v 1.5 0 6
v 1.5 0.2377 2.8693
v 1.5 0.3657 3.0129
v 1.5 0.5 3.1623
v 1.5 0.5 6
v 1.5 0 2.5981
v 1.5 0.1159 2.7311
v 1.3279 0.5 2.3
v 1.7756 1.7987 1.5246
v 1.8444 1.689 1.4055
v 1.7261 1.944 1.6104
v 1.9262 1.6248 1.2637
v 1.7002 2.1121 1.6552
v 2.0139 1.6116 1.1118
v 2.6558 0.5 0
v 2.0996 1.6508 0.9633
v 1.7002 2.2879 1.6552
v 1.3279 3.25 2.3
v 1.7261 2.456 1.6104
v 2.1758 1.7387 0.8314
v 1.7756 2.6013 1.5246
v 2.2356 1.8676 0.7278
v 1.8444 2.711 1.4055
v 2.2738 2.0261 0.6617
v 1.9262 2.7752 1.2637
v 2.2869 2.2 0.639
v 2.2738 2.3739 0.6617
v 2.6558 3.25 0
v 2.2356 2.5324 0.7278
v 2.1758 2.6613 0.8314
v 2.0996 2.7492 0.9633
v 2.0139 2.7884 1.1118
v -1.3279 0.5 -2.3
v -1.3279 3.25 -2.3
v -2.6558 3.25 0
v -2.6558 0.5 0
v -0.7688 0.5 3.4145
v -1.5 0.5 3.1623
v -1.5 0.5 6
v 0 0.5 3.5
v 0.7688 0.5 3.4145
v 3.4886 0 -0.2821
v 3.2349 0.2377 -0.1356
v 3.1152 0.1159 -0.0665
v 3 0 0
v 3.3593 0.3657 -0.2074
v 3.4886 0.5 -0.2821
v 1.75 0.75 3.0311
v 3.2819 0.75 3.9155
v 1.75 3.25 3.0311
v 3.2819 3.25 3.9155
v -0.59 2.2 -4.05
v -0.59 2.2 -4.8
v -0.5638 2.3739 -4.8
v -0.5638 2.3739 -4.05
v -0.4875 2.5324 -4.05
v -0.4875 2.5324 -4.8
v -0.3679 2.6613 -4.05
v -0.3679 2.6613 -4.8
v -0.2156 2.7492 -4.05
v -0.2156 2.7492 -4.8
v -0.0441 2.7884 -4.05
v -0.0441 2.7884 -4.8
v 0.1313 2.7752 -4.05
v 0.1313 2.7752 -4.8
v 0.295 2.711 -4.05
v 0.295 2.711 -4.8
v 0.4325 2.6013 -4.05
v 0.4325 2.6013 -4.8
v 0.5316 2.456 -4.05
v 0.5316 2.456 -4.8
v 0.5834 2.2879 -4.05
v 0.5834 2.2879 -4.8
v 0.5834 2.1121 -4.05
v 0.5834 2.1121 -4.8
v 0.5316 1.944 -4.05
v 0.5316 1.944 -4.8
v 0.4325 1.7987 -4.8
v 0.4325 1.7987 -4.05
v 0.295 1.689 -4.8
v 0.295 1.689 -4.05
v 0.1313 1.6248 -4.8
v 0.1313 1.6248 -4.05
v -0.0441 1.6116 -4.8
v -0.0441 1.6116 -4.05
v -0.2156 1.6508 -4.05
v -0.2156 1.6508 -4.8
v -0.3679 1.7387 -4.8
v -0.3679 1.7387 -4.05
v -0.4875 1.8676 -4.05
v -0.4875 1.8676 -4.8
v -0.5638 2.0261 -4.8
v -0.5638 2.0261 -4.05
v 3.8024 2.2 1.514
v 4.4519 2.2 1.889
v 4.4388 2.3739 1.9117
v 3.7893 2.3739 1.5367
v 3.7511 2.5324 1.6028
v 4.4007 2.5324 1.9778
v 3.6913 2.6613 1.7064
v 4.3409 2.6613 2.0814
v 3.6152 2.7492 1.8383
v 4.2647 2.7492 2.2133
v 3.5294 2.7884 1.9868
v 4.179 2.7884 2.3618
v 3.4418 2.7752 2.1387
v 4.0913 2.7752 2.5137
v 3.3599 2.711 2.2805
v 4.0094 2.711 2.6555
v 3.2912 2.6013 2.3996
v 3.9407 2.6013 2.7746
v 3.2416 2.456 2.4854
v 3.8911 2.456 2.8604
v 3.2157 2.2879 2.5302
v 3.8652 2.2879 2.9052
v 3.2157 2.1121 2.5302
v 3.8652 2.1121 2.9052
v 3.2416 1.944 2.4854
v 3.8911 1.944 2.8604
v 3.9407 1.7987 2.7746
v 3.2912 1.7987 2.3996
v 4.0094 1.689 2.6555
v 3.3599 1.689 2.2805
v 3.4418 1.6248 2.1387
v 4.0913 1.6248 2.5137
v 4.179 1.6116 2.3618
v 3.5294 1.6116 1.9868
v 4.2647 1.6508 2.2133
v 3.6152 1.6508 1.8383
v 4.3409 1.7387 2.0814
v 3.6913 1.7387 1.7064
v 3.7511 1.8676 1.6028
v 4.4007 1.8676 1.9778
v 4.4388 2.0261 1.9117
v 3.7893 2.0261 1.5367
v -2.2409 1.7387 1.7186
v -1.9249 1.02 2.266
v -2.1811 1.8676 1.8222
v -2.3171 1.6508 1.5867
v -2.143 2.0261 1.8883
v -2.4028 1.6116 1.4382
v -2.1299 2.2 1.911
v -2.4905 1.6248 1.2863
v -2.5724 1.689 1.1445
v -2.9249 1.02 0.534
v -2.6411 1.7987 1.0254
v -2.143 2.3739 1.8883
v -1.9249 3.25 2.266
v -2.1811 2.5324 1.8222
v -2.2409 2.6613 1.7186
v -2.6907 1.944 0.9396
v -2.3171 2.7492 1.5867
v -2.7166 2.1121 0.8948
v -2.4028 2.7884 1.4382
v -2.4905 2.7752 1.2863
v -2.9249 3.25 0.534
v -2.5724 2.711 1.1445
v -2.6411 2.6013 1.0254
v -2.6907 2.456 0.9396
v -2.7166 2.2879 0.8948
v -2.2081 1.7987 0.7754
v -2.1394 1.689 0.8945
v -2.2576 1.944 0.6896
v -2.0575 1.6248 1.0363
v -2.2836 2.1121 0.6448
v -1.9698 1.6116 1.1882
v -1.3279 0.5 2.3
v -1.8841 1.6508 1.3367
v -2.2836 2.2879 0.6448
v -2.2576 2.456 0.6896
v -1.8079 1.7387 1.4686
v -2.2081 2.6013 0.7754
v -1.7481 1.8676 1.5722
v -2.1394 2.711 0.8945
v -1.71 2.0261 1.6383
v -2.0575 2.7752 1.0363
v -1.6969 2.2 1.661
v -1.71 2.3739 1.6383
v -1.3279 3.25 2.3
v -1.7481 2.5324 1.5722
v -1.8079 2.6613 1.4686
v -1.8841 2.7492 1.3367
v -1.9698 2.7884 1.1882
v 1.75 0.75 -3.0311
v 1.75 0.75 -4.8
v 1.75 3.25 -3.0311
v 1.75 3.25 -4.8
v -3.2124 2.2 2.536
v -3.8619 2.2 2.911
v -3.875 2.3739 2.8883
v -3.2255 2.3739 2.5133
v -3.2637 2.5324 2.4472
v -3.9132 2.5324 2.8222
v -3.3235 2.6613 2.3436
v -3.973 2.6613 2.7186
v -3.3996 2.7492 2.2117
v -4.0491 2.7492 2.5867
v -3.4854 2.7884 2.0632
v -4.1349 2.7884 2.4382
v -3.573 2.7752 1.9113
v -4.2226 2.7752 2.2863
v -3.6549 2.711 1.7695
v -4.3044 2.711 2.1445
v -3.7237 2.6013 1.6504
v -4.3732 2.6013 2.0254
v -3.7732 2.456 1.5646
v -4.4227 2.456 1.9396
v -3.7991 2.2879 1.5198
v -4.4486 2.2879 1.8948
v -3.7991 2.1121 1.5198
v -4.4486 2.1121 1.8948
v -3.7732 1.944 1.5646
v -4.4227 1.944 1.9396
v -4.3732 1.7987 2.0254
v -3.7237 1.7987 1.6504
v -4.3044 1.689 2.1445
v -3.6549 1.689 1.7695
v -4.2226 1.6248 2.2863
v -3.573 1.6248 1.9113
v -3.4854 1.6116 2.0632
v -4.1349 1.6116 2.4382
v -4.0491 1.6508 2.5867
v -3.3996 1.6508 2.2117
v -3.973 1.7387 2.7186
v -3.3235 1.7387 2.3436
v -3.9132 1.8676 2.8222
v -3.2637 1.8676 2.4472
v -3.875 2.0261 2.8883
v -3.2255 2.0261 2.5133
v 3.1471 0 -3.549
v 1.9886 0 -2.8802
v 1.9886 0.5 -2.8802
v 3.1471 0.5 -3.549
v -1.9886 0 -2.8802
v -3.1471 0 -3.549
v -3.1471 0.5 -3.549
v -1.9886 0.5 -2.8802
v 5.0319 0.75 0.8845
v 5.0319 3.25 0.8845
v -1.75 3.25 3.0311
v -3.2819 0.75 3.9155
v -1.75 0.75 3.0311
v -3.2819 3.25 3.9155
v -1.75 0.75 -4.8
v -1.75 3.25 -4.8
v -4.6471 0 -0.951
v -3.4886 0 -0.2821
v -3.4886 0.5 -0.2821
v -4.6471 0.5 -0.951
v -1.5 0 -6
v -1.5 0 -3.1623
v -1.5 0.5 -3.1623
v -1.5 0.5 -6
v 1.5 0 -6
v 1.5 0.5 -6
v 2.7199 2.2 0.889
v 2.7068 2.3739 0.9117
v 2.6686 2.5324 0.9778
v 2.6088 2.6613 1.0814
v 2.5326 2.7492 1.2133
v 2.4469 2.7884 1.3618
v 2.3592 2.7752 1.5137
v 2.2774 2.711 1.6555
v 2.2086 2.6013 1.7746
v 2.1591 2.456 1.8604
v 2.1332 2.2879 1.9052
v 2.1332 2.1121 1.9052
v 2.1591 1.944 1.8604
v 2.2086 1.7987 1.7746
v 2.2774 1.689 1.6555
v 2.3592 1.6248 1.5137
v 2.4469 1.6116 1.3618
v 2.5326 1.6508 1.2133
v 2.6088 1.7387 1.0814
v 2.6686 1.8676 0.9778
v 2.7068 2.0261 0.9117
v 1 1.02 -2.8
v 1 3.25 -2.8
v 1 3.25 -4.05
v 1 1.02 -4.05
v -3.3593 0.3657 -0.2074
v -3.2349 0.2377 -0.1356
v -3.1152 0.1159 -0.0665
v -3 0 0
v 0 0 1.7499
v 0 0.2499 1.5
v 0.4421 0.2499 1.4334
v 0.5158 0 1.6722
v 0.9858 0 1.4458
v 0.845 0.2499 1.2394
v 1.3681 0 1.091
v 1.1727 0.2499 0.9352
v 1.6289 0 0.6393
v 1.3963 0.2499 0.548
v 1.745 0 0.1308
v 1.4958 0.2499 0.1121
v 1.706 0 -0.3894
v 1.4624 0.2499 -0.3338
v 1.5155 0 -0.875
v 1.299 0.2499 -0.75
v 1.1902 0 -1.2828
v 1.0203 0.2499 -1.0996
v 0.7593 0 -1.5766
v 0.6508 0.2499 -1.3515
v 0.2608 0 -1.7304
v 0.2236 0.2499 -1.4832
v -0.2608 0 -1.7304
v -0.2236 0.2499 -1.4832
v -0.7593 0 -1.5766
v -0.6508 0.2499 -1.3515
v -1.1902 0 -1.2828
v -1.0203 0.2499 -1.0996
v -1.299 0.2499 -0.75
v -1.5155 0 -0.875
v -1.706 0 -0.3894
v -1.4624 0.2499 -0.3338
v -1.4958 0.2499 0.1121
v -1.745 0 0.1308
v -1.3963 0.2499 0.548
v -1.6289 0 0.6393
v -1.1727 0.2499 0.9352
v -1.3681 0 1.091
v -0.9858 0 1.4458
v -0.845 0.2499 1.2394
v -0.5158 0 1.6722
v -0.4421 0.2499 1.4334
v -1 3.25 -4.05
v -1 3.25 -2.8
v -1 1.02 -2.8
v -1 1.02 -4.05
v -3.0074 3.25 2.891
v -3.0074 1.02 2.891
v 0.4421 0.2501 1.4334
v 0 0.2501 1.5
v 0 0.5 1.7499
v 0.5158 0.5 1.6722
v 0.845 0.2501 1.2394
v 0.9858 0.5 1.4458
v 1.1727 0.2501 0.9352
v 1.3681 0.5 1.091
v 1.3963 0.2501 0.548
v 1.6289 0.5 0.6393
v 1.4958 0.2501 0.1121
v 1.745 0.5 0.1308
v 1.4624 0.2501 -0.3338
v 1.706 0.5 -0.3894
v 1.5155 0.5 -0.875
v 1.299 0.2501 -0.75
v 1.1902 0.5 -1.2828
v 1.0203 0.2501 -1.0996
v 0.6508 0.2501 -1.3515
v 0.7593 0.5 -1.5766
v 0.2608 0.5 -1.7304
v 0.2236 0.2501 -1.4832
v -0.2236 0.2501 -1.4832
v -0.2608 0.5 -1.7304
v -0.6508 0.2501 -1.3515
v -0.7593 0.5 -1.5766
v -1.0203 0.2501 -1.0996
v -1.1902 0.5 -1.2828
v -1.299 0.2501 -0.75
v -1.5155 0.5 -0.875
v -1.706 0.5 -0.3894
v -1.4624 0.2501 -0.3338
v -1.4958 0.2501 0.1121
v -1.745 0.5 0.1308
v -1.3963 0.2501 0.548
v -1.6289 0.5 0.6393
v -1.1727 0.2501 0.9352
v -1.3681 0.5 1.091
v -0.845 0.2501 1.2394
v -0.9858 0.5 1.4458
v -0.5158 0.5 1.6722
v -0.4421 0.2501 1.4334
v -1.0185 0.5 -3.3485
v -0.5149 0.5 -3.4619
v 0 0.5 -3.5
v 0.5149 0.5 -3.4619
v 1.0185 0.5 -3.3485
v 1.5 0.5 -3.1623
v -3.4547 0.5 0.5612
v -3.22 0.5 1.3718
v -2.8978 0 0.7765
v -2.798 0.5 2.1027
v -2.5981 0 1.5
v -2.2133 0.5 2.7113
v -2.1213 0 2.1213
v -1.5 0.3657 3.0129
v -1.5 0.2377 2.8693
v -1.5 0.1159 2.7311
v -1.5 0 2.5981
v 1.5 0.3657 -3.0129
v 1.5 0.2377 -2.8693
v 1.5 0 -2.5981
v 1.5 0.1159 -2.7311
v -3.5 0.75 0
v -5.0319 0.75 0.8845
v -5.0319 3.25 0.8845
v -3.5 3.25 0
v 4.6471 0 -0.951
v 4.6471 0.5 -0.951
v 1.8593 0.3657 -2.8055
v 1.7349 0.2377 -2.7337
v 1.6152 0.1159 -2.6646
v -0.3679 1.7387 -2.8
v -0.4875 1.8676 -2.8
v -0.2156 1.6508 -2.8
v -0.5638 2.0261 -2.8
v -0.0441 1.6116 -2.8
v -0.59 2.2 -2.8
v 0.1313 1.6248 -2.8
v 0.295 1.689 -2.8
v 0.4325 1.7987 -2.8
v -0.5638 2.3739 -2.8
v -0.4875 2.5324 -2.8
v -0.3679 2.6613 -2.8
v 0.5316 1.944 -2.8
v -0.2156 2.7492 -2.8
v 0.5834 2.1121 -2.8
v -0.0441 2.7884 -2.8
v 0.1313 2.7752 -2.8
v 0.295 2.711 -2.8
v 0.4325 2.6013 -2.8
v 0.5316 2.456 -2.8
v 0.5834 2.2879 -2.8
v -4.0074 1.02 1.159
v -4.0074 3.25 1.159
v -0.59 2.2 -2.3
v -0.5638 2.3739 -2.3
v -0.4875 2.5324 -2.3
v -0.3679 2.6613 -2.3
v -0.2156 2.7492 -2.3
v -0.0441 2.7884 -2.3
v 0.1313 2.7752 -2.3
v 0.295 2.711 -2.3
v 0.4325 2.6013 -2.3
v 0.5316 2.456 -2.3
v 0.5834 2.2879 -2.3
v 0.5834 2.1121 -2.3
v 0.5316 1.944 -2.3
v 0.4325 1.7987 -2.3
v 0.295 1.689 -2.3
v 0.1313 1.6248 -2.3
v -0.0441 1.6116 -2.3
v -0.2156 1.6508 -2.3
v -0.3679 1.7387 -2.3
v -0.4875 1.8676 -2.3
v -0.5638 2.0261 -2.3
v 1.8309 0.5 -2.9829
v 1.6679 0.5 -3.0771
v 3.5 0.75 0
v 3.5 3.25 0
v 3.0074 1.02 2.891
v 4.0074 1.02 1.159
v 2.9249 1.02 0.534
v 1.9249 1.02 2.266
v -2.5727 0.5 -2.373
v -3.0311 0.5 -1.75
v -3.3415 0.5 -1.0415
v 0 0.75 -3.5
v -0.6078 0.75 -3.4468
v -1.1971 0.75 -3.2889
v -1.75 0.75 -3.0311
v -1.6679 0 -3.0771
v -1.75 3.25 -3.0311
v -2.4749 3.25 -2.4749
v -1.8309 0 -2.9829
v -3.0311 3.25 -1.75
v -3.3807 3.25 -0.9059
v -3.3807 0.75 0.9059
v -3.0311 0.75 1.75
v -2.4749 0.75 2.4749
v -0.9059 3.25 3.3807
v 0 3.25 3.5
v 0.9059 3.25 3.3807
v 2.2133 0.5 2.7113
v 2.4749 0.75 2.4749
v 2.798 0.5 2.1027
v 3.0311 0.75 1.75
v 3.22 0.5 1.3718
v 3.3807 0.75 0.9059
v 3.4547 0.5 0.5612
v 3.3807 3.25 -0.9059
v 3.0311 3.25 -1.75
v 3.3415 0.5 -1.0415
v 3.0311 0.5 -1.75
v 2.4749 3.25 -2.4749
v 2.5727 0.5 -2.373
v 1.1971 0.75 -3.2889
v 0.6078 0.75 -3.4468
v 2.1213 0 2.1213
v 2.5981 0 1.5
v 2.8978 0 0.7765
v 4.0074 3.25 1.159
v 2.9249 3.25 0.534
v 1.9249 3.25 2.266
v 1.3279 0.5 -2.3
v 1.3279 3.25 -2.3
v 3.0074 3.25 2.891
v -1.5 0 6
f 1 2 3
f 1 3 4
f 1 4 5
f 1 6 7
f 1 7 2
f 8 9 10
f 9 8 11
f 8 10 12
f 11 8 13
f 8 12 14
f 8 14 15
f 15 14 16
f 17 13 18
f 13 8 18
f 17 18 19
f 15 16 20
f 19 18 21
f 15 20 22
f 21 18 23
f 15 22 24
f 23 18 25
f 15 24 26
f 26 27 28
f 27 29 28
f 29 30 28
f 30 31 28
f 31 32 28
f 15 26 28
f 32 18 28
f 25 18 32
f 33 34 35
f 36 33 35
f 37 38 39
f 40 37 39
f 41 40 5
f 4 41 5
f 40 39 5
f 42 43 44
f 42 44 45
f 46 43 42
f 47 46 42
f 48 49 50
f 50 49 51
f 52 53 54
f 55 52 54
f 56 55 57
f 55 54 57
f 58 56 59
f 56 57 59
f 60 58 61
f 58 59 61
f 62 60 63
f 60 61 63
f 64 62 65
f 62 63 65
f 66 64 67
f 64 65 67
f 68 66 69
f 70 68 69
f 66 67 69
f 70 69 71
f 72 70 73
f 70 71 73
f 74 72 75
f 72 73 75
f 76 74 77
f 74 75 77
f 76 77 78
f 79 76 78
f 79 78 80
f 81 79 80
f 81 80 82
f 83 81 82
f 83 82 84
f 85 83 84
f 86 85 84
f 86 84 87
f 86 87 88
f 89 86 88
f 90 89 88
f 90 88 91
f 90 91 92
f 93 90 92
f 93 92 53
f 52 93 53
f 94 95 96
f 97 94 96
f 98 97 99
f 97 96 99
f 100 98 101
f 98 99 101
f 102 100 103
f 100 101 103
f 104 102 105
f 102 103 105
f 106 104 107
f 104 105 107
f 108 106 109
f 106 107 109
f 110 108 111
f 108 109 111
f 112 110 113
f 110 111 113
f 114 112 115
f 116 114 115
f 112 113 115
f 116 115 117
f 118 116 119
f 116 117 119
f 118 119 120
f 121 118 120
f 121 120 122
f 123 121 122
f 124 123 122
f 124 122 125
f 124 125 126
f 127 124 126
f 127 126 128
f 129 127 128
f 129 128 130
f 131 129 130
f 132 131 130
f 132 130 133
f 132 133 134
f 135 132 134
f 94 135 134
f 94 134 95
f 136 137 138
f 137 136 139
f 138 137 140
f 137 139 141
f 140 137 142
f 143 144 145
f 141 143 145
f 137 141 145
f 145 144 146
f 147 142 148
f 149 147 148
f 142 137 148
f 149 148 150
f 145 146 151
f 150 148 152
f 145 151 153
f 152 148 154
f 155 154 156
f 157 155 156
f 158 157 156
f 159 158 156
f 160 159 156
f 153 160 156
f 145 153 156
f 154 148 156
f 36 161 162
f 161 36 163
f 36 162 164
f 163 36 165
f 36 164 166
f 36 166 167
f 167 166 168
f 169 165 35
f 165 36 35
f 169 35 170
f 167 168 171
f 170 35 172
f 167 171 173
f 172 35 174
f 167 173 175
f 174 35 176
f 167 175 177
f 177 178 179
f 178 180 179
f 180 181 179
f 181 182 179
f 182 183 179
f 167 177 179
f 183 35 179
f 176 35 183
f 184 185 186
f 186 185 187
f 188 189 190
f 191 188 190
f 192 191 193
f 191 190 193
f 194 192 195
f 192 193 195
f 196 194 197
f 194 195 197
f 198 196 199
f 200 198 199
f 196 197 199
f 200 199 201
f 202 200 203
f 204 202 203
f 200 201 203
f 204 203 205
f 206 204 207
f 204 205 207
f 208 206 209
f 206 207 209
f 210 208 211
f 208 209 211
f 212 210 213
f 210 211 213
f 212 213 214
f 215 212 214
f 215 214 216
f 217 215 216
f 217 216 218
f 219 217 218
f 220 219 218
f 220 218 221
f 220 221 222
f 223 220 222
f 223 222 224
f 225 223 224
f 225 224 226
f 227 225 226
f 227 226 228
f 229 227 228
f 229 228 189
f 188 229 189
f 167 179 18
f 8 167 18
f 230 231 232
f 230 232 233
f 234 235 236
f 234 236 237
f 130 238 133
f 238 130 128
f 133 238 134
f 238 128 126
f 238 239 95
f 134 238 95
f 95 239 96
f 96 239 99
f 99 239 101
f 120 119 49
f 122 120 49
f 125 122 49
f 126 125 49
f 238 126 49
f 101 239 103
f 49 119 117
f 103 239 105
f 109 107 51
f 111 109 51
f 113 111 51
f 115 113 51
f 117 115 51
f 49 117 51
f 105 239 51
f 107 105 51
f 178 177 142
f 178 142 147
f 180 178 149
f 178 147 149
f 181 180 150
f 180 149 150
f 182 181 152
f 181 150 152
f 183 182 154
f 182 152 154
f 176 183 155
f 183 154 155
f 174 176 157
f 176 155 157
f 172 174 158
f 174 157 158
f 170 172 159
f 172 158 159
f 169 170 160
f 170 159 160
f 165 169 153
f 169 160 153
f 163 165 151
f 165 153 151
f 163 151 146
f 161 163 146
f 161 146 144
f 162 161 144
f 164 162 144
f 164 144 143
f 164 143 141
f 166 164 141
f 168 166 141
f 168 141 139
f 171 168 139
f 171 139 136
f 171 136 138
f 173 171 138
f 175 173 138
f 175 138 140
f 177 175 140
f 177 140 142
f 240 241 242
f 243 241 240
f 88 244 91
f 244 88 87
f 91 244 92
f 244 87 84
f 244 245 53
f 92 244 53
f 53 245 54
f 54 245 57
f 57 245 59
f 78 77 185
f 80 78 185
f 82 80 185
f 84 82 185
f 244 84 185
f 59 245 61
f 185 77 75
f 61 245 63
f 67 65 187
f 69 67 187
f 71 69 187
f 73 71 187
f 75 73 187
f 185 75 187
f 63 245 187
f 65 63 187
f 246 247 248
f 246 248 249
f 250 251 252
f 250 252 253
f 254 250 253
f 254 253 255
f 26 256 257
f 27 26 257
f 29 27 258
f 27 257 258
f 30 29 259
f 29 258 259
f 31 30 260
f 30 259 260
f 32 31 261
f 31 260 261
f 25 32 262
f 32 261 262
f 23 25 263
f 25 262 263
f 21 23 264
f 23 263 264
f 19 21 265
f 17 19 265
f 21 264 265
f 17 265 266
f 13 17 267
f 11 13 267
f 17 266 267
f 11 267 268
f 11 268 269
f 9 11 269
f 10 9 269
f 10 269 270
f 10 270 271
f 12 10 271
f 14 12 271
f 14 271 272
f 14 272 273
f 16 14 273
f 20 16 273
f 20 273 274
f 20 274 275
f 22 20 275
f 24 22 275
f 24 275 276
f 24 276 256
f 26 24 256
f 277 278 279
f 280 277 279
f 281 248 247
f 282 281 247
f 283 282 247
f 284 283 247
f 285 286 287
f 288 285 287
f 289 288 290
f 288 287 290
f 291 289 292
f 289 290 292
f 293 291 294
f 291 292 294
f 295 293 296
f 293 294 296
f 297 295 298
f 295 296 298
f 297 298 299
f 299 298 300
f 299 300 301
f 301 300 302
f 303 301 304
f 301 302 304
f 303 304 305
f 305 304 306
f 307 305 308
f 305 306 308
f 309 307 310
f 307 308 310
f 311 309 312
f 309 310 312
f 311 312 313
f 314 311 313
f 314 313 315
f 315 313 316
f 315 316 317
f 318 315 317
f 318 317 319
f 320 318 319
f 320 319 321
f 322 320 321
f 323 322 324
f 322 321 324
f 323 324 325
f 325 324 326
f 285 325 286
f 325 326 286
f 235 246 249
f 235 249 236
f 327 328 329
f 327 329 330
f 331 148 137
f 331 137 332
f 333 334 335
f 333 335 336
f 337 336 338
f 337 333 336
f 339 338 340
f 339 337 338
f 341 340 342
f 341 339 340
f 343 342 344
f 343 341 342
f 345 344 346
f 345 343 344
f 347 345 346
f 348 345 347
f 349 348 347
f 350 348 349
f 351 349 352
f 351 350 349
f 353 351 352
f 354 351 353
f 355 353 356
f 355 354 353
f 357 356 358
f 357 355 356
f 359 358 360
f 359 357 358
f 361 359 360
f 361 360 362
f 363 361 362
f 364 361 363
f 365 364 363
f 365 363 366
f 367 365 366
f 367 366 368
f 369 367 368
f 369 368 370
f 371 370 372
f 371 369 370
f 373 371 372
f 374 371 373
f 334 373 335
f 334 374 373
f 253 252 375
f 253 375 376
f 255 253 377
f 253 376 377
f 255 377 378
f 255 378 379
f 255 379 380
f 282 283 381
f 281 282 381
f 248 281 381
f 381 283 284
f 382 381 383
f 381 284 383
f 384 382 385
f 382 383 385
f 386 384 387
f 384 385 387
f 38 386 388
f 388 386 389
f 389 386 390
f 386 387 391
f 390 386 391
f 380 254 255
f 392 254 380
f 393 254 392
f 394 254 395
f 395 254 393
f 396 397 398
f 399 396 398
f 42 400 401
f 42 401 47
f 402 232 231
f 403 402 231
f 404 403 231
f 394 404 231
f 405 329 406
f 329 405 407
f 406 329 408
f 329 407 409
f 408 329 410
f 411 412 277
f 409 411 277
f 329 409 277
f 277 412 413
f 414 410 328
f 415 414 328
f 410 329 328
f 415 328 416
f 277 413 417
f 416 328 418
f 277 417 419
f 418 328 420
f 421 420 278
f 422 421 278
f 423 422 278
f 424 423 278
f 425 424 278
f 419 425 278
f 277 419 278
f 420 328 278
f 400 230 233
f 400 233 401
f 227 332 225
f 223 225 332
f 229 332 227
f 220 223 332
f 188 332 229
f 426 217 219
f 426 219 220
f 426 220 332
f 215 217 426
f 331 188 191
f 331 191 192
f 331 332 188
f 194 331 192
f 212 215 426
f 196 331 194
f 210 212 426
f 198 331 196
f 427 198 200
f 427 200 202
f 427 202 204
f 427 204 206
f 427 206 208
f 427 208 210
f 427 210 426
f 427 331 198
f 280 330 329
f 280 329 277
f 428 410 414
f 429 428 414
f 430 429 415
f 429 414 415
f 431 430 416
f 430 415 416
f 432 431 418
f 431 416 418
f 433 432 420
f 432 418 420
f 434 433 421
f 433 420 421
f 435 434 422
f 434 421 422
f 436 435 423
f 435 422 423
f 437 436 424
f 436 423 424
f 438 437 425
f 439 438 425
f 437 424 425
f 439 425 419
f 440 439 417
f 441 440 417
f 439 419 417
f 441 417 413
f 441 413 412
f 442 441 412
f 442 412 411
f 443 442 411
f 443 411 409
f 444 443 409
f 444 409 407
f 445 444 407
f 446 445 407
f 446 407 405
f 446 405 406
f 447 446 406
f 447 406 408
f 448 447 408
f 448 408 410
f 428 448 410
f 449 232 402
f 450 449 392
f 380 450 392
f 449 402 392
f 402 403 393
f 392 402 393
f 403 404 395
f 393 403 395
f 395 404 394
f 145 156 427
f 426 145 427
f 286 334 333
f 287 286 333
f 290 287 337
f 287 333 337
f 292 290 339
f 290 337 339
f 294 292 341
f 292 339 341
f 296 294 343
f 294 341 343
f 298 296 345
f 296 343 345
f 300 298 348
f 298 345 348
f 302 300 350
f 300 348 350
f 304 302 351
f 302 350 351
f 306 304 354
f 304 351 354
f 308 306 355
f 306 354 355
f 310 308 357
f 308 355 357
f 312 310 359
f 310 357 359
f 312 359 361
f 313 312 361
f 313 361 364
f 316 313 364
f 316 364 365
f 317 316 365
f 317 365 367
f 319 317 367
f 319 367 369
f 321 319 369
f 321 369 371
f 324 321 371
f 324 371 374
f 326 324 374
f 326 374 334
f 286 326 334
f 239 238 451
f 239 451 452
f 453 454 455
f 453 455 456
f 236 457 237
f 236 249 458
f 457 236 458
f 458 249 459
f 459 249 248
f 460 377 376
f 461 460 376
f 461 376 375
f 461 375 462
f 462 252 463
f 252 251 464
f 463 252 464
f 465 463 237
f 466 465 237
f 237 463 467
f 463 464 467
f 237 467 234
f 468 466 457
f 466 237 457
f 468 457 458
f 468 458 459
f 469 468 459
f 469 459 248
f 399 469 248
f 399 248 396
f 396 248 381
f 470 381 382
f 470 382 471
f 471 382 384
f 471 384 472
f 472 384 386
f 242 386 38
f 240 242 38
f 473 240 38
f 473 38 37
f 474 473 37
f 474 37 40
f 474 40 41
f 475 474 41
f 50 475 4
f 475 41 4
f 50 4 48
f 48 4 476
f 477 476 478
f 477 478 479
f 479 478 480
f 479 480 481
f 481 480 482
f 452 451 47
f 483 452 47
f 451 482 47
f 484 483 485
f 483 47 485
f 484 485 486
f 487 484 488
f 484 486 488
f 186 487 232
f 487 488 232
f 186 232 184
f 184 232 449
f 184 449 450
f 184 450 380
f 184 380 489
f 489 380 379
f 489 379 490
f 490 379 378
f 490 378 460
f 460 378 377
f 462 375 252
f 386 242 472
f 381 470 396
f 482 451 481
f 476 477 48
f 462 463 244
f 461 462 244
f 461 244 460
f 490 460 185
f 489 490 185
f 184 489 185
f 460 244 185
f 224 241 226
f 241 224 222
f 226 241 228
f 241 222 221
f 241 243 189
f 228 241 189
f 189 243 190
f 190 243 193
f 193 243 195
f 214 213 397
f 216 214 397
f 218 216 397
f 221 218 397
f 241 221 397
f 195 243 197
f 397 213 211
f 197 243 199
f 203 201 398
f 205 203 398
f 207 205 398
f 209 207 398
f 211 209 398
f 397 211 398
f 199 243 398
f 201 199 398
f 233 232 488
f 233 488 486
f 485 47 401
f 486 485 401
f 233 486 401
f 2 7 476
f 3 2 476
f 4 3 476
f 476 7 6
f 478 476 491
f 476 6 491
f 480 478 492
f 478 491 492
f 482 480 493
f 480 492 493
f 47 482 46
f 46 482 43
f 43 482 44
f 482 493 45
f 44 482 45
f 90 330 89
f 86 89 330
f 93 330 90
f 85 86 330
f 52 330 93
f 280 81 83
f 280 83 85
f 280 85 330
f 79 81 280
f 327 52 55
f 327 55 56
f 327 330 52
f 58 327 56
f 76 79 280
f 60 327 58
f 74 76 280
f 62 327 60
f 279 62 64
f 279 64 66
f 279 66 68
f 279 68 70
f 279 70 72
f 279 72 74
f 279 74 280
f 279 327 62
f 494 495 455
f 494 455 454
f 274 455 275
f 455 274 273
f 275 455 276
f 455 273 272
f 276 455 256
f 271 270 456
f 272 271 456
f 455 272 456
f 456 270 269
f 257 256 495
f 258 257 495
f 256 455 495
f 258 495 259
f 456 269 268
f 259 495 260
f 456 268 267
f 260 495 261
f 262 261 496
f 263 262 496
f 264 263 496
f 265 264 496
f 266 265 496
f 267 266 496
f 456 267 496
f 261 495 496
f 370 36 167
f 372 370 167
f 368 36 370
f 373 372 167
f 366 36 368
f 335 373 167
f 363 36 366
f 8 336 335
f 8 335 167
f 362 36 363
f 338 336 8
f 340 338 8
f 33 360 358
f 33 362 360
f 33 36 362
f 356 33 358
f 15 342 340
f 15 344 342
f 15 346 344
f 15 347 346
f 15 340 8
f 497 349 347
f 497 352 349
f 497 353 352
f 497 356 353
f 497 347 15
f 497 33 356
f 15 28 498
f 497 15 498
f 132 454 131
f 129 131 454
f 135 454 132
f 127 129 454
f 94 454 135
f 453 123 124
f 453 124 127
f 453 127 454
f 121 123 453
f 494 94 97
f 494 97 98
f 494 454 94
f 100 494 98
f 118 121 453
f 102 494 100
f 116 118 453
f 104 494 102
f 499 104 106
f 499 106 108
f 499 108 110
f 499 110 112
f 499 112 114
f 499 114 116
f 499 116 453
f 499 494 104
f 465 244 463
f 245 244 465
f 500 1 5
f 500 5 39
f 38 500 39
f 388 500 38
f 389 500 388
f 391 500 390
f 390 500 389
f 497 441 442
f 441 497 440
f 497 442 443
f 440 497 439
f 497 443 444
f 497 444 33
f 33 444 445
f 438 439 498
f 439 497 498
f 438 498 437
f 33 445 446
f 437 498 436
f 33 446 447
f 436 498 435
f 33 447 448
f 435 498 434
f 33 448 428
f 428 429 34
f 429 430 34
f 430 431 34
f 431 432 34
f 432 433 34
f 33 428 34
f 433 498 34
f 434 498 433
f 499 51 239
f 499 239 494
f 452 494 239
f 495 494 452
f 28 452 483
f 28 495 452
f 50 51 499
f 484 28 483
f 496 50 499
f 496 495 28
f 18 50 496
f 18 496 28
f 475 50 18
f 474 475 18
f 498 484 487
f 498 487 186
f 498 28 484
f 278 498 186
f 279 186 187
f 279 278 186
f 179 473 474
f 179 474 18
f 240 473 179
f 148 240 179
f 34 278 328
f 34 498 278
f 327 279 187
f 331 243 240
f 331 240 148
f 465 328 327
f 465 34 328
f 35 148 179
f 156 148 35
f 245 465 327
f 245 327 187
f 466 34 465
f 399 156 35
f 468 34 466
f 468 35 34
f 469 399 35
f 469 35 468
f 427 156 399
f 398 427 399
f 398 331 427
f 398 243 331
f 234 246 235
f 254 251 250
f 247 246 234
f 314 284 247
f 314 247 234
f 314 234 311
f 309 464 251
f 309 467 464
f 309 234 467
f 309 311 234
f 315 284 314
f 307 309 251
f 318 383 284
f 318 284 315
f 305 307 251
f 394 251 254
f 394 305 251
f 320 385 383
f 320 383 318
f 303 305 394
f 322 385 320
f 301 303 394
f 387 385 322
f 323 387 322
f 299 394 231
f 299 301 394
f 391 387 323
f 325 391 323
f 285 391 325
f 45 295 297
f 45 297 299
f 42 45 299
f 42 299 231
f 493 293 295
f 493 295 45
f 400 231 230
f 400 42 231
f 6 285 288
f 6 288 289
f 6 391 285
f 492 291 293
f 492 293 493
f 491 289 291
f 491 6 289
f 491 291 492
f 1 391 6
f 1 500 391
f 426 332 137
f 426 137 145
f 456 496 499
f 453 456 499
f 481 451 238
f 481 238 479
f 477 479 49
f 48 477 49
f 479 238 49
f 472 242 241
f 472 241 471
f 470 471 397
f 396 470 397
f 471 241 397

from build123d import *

# Parameters (mm, degrees)
SKETCH1_R           = 3.5
BOSS_EXTRUDE1_DEPTH = 3.25
CUT_EXTRUDE1_DEPTH  = 2.75
SKETCH3_R           = 1.5
CUT_EXTRUDE2_DEPTH  = 6.662375826
BOSS_EXTRUDE6_DEPTH = 0.5
BOSS_EXTRUDE4_START = -2
SKETCH6_W           = 3.5
SKETCH6_H           = 2.5
BOSS_EXTRUDE4_DEPTH = 2.5
SKETCH7_W           = 2
SKETCH7_H           = 1.25
CUT_EXTRUDE3_DEPTH  = 2.23
SKETCH8_R           = 0.59
CUT_EXTRUDE4_DEPTH  = 4
CHAMFER3_SIZE       = 0.5
CIRPATTERN1_COUNT   = 3
CHAMFER4_SIZE       = 0.25


# Some blends are built 0.0001 mm under size
with BuildPart() as part:
    # Sketch1 → Boss-Extrude1 (new body)
    with BuildSketch(Plane(origin=(0, 0, 0), x_dir=(1, 0, 0), z_dir=(0, 1, 0))):
        with Locations(Location((0, 0, 0), (0, 0, 90))):
            Circle(SKETCH1_R)
    extrude(amount=BOSS_EXTRUDE1_DEPTH)

    # Sketch2 → Cut-Extrude1 (cut)
    with BuildSketch(Plane(origin=(0, 3.25, 0), x_dir=(1, 0, 0), z_dir=(0, 1, 0))):
        Polygon((1.327905619, -2.3), (2.655811238, 0), (1.327905619, 2.3), (-1.327905619, 2.3), (-2.655811238, 0), (-1.327905619, -2.3), align=None)
    extrude(amount=-CUT_EXTRUDE1_DEPTH, mode=Mode.SUBTRACT)

    # Sketch3 → Cut-Extrude2 (cut, through all)
    with BuildSketch(Plane(origin=(0, 0.5, 0), x_dir=(1, 0, 0), z_dir=(0, 1, 0))):
        with Locations(Location((0, 0, 0), (0, 0, 270))):
            Circle(SKETCH3_R)
    extrude(amount=-CUT_EXTRUDE2_DEPTH, mode=Mode.SUBTRACT)

    # Sketch4 → Boss-Extrude6 (add)
    with BuildSketch(Plane.XZ):
        with BuildLine():
            Line((-1.5, 4.5), (-1.5, 3.16227766))
            ThreePointArc((-1.5, 3.16227766), (0, 3.5), (1.5, 3.16227766))
            Line((1.5, 3.16227766), (1.5, 4.5))
            Line((1.5, 4.5), (1.5, 6))
            Line((1.5, 6), (-1.5, 6))
            Line((-1.5, 6), (-1.5, 4.5))
        make_face()
        with BuildLine():
            Line((4.647114317, -0.950961894), (3.488612788, -0.282100724))
            ThreePointArc((3.488612788, -0.282100724), (3.031088913, -1.75), (1.988612788, -2.880176936))
            Line((1.988612788, -2.880176936), (3.147114317, -3.549038106))
            Line((3.147114317, -3.549038106), (4.647114317, -0.950961894))
        make_face()
        with BuildLine():
            Line((-3.147114317, -3.549038106), (-1.988612788, -2.880176936))
            ThreePointArc((-1.988612788, -2.880176936), (-3.031088913, -1.75), (-3.488612788, -0.282100724))
            Line((-3.488612788, -0.282100724), (-4.647114317, -0.950961894))
            Line((-4.647114317, -0.950961894), (-3.147114317, -3.549038106))
        make_face()
        with BuildLine():
            Line((1.5, -4.5), (1.5, -3.16227766))
            ThreePointArc((1.5, -3.16227766), (0, -3.5), (-1.5, -3.16227766))
            Line((-1.5, -3.16227766), (-1.5, -4.5))
            Line((-1.5, -4.5), (-1.5, -6))
            Line((-1.5, -6), (1.5, -6))
            Line((1.5, -6), (1.5, -4.5))
        make_face()
    extrude(amount=-BOSS_EXTRUDE6_DEPTH)

    # Sketch6 → Boss-Extrude4 (add)
    with BuildSketch(Plane.XY.offset(-2.8).offset(BOSS_EXTRUDE4_START)):
        with Locations((0, 2)):
            Rectangle(SKETCH6_W, SKETCH6_H)
    boss_extrude4 = extrude(amount=BOSS_EXTRUDE4_DEPTH)

    # Sketch7 → Cut-Extrude3 (cut)
    with BuildSketch(Plane(origin=(0, 3.25, 0), x_dir=(1, 0, 0), z_dir=(0, 1, 0))):
        with Locations((0, 3.425)):
            Rectangle(SKETCH7_W, SKETCH7_H)
    cut_extrude3 = extrude(amount=-CUT_EXTRUDE3_DEPTH, mode=Mode.SUBTRACT)

    # Sketch8 → Cut-Extrude4 (cut)
    with BuildSketch(Plane(origin=(0, 0, -4.8), x_dir=(-1, 0, 0), z_dir=(0, 0, -1))):
        with Locations((0, 2.2)):
            Circle(SKETCH8_R)
    cut_extrude4 = extrude(amount=-CUT_EXTRUDE4_DEPTH, mode=Mode.SUBTRACT)

    # Chamfer3
    # the kernel refuses this chamfer: 0.5 mm, written as the material it takes off along each edge
    with BuildSketch(Plane(origin=(0, 0, 0), x_dir=(-0.90124662040542, 0, -0.4333065072299383), z_dir=(0.4333065072299383, 0, -0.90124662040542))) as chamfer3_piece_1_section:
        Polygon((3.5, CHAMFER3_SIZE), (3.5 - CHAMFER3_SIZE, 0), (3.5, 0), align=None)
    chamfer3_piece_1 = revolve(axis=Axis((0, 0, 0), (0, 1, 0)), revolution_arc=111.355166333, mode=Mode.PRIVATE)
    chamfer3_piece_1 = split(chamfer3_piece_1, bisect_by=Plane(origin=(-2.813419939, 0.5, 1.624328759), z_dir=(0, -1, 0)), keep=Keep.TOP, mode=Mode.PRIVATE)
    chamfer3_piece_1 = split(chamfer3_piece_1, bisect_by=Plane(origin=(-2.15670997, 0.237200346, 0.486873726), z_dir=(-0.5000000000000004, 0, 0.8660254037844385)), keep=Keep.TOP, mode=Mode.PRIVATE)
    chamfer3_piece_1 = split(chamfer3_piece_1, bisect_by=Plane(origin=(-1.5, 0.237200346, 1.624328759), z_dir=(-1, 0, 0)), keep=Keep.TOP, mode=Mode.PRIVATE)
    add(chamfer3_piece_1, mode=Mode.SUBTRACT)
    with BuildSketch(Plane(origin=(0, 0, 0), x_dir=(0.8258293731996098, 0, -0.5639200708972323), z_dir=(0.5639200708972323, 0, 0.8258293731996098))) as chamfer3_piece_2_section:
        Polygon((3.5, CHAMFER3_SIZE), (3.5 - CHAMFER3_SIZE, 0), (3.5, 0), align=None)
    chamfer3_piece_2 = revolve(axis=Axis((0, 0, 0), (0, 1, 0)), revolution_arc=51.345334665, mode=Mode.PRIVATE)
    chamfer3_piece_2 = split(chamfer3_piece_2, bisect_by=Plane(origin=(1.689638758, 0.5, -2.926540175), z_dir=(0, -1, 0)), keep=Keep.TOP, mode=Mode.PRIVATE)
    chamfer3_piece_2 = split(chamfer3_piece_2, bisect_by=Plane(origin=(1.784458137, 0.189171232, -2.762308193), z_dir=(-0.5000000000000001, 0, -0.8660254037844386)), keep=Keep.TOP, mode=Mode.PRIVATE)
    chamfer3_piece_2 = split(chamfer3_piece_2, bisect_by=Plane(origin=(1.5, 0.189171232, -2.926540175), z_dir=(1, 0, 0)), keep=Keep.TOP, mode=Mode.PRIVATE)
    add(chamfer3_piece_2, mode=Mode.SUBTRACT)
    with BuildSketch(Plane(origin=(0, 0, 0), x_dir=(0.0753688673164782, 0, 0.9971557219609338), z_dir=(-0.9971557219609338, 0, 0.0753688673164782))) as chamfer3_piece_3_section:
        Polygon((3.5, CHAMFER3_SIZE), (3.5 - CHAMFER3_SIZE, 0), (3.5, 0), align=None)
    chamfer3_piece_3 = revolve(axis=Axis((0, 0, 0), (0, 1, 0)), revolution_arc=111.355166333, mode=Mode.PRIVATE)
    chamfer3_piece_3 = split(chamfer3_piece_3, bisect_by=Plane(origin=(2.813419939, 0.5, 1.624328759), z_dir=(0, -1, 0)), keep=Keep.TOP, mode=Mode.PRIVATE)
    chamfer3_piece_3 = split(chamfer3_piece_3, bisect_by=Plane(origin=(1.5, 0.237200346, 1.624328759), z_dir=(1, 0, 0)), keep=Keep.TOP, mode=Mode.PRIVATE)
    chamfer3_piece_3 = split(chamfer3_piece_3, bisect_by=Plane(origin=(2.15670997, 0.237200346, 0.486873726), z_dir=(0.4999999999999997, 0, 0.8660254037844388)), keep=Keep.TOP, mode=Mode.PRIVATE)
    add(chamfer3_piece_3, mode=Mode.SUBTRACT)

    # CirPattern1: Boss-Extrude4, Cut-Extrude3, Cut-Extrude4 ×3 about axis
    cirpattern1_axis = Axis((0, 0, 0), (0, 1, 0))
    add([boss_extrude4.rotate(cirpattern1_axis, i * 360 / CIRPATTERN1_COUNT) for i in range(1, CIRPATTERN1_COUNT)])
    add([cut_extrude3.rotate(cirpattern1_axis, i * 360 / CIRPATTERN1_COUNT) for i in range(1, CIRPATTERN1_COUNT)], mode=Mode.SUBTRACT)
    add([cut_extrude4.rotate(cirpattern1_axis, i * 360 / CIRPATTERN1_COUNT) for i in range(1, CIRPATTERN1_COUNT)], mode=Mode.SUBTRACT)

    # Chamfer4
    chamfer4_edges = [part.edges().sort_by_distance(p)[0] for p in [
        (0, 0, -1.5),
        (0, 0.5, -1.5),
    ]]
    chamfer(chamfer4_edges, length=CHAMFER4_SIZE - 0.0001)  # a hair under: the kernel refuses the full size


solid = part.part
